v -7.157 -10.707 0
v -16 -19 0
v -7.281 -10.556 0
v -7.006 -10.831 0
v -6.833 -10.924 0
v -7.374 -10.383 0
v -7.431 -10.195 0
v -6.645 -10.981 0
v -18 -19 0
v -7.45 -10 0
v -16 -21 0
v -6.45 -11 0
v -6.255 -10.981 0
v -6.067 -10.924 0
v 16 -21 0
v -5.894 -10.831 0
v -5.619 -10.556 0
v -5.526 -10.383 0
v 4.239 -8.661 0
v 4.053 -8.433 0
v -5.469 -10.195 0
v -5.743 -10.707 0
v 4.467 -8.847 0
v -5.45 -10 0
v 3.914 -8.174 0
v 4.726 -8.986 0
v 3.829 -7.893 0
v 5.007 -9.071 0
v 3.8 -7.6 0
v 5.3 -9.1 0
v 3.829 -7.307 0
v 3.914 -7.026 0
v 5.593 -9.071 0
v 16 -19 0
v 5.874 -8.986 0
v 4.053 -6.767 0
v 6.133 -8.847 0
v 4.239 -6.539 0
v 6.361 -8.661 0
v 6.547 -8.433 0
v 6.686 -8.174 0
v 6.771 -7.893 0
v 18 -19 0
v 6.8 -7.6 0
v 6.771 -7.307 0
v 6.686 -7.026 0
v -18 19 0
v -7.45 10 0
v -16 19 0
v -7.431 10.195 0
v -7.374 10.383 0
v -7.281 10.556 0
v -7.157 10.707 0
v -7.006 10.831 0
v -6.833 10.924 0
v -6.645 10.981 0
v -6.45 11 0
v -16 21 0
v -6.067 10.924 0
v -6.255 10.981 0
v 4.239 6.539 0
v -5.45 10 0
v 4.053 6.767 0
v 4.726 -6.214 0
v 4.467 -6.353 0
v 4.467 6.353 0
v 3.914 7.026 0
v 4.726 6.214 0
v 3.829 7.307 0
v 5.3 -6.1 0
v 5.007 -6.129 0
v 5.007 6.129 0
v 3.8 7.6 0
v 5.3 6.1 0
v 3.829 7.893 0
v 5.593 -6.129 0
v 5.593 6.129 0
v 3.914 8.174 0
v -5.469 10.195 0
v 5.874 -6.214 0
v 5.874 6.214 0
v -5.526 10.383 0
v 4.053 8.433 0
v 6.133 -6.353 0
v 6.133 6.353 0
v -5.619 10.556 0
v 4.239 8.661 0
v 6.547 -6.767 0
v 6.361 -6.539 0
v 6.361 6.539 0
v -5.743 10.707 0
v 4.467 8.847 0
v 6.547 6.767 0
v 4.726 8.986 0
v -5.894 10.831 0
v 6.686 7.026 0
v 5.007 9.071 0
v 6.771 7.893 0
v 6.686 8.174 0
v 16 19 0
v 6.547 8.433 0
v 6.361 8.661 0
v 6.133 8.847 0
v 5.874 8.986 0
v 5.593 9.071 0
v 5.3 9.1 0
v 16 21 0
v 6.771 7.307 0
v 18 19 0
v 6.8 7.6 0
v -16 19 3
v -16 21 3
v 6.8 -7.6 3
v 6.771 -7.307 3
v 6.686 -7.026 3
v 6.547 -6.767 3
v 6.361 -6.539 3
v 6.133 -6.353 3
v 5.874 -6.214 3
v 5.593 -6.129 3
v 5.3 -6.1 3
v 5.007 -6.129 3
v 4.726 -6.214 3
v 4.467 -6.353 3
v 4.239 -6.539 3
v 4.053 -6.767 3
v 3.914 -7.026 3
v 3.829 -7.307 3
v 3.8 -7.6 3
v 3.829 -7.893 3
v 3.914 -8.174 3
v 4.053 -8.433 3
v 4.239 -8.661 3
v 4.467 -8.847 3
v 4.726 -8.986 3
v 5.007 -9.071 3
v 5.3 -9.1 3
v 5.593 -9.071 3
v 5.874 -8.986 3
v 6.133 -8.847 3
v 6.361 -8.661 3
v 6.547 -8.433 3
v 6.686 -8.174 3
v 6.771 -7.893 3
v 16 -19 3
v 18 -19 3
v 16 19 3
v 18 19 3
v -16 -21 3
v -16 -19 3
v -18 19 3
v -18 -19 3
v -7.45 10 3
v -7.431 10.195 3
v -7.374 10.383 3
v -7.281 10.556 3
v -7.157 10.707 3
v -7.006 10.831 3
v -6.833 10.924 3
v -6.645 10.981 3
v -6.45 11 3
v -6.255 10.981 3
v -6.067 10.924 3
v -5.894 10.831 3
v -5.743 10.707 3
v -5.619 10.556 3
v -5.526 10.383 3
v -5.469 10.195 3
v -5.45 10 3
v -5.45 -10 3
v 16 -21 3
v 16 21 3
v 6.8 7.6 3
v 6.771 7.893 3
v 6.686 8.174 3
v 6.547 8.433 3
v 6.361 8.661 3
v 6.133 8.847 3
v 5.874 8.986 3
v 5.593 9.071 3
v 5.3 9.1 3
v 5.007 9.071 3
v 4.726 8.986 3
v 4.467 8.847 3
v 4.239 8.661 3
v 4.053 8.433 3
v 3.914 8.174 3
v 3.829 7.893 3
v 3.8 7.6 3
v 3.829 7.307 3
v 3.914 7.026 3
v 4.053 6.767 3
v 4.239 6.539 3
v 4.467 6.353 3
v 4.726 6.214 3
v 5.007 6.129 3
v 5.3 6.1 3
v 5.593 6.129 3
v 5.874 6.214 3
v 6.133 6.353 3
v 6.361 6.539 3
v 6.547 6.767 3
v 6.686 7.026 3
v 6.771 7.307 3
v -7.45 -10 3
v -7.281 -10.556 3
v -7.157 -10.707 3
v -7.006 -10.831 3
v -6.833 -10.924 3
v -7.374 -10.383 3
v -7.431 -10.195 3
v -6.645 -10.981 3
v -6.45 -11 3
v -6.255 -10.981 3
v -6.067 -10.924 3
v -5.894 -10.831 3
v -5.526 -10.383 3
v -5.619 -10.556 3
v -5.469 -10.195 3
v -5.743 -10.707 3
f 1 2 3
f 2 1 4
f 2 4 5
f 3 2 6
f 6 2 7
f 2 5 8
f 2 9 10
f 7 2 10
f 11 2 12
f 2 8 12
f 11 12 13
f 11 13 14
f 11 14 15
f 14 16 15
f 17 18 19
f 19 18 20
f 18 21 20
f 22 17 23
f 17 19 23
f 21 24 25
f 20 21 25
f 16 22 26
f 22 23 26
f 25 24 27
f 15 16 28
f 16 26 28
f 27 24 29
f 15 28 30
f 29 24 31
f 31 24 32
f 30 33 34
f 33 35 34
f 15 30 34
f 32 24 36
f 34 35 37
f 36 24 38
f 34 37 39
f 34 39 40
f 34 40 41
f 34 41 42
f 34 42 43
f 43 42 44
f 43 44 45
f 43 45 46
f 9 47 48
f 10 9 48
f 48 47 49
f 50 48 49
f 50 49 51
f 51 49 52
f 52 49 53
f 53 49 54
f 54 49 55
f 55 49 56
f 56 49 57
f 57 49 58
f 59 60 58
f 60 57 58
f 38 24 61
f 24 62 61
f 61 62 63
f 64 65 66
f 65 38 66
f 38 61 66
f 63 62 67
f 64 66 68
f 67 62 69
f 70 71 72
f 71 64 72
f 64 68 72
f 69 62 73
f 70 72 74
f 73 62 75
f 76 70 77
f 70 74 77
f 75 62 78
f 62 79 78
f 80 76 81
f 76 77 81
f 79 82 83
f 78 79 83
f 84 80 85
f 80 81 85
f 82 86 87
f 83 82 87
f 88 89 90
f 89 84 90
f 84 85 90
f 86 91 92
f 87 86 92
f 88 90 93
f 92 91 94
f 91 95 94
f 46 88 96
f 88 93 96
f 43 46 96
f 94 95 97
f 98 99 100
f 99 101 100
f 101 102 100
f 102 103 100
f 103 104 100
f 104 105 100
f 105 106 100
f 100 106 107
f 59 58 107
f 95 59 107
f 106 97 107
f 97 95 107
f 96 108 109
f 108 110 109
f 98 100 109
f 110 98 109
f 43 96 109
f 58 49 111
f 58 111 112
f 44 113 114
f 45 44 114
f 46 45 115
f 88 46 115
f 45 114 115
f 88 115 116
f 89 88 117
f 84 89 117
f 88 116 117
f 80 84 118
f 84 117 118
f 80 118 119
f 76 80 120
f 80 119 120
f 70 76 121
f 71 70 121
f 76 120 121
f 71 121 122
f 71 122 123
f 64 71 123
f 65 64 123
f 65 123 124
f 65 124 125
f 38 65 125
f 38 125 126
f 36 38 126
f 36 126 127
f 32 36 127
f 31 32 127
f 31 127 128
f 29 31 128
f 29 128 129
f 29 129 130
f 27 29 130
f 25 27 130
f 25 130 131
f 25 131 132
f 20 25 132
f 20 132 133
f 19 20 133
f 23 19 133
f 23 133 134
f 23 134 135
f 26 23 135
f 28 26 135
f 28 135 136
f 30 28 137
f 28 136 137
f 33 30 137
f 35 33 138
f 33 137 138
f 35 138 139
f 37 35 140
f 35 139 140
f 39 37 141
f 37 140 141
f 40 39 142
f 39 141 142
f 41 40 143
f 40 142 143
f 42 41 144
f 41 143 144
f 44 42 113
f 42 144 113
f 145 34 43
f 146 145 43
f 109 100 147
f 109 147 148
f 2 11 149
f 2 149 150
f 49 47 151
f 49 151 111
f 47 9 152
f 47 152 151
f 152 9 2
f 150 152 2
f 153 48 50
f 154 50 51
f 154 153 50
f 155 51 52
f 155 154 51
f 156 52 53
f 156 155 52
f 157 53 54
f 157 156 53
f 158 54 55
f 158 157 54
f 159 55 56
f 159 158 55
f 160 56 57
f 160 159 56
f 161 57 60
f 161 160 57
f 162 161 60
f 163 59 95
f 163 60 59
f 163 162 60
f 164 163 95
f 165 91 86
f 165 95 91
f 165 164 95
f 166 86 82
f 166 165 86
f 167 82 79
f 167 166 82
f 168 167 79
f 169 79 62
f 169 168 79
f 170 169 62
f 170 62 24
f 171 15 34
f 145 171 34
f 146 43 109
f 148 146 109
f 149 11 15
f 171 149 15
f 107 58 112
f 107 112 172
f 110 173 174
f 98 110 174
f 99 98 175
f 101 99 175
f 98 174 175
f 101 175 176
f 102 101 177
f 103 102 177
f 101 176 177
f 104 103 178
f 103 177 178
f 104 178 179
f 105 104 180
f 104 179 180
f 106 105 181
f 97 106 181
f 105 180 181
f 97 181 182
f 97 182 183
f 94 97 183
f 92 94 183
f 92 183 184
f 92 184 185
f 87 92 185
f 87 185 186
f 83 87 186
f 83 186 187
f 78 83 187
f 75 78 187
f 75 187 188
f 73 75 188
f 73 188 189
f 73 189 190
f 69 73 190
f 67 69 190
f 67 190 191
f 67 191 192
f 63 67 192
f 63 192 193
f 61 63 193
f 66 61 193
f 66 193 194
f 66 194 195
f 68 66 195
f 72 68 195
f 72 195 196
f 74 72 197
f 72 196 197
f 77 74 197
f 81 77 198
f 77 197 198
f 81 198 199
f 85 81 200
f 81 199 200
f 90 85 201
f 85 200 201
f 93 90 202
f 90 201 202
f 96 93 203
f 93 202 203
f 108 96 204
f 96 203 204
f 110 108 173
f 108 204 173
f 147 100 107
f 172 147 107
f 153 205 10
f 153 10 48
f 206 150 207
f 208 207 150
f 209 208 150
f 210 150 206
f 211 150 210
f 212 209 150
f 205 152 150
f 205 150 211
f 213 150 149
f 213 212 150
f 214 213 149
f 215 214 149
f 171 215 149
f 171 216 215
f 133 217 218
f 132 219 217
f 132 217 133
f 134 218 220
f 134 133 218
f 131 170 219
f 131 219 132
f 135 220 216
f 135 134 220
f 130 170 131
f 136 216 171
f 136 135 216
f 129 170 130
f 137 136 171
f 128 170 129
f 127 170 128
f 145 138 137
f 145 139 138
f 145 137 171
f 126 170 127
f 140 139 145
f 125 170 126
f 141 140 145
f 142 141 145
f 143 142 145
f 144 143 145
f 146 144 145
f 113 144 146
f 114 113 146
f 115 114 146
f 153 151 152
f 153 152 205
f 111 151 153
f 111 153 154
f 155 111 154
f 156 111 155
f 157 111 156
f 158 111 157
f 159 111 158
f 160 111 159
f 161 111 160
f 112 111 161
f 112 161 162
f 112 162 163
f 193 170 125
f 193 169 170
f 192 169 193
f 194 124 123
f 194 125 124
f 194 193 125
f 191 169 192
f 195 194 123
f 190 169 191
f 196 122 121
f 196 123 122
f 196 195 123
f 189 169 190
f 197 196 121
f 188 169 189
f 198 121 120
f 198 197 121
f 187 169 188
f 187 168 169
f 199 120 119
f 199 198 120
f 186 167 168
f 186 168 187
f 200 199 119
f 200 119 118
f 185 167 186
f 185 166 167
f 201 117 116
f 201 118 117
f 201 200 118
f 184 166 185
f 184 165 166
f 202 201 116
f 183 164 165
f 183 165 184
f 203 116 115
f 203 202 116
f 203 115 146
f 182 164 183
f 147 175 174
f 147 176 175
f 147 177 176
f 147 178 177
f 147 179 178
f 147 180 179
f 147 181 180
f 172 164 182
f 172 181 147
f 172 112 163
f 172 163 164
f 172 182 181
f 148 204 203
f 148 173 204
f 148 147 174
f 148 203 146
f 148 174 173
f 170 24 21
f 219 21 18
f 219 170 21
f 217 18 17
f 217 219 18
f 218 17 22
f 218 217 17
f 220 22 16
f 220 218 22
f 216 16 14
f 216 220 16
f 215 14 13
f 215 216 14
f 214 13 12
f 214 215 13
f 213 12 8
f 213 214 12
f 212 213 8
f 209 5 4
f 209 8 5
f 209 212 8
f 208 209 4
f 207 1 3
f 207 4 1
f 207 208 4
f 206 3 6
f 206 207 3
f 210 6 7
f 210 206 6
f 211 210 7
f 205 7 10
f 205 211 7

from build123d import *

# Parameters (mm, degrees)
SKETCH_1_W          = 32
SKETCH_1_H          = 42
SKETCH_1_W_2        = 2
SKETCH_1_H_2        = 38
EXTRUDE_1_DEPTH     = 3
SKETCH_2_R          = 1.5
CUT_EXTRUDE_1_DEPTH = 10


with BuildPart() as part:
    # 草图1 → 凸台-拉伸1 (new body)
    with BuildSketch(Plane.XY):
        Rectangle(SKETCH_1_W, SKETCH_1_H)
        with Locations((-17, 0)):
            Rectangle(SKETCH_1_W_2, SKETCH_1_H_2)
        with Locations((17, 0)):
            Rectangle(SKETCH_1_W_2, SKETCH_1_H_2)
    extrude(amount=EXTRUDE_1_DEPTH)

    # 草图2 → 切除-拉伸1 (cut)
    with BuildSketch(Plane.XY.offset(3)):
        with Locations((5.3, -7.6)):
            Circle(SKETCH_2_R)
        with Locations((5.3, 7.6)):
            Circle(SKETCH_2_R)
        with BuildLine():
            Line((-7.45, -10), (-7.45, 10))
            ThreePointArc((-7.45, 10), (-6.45, 11), (-5.45, 10))
            Line((-5.45, 10), (-5.45, -10))
            ThreePointArc((-5.45, -10), (-6.45, -11), (-7.45, -10))
        make_face()
    extrude(amount=-CUT_EXTRUDE_1_DEPTH, mode=Mode.SUBTRACT)


solid = part.part
